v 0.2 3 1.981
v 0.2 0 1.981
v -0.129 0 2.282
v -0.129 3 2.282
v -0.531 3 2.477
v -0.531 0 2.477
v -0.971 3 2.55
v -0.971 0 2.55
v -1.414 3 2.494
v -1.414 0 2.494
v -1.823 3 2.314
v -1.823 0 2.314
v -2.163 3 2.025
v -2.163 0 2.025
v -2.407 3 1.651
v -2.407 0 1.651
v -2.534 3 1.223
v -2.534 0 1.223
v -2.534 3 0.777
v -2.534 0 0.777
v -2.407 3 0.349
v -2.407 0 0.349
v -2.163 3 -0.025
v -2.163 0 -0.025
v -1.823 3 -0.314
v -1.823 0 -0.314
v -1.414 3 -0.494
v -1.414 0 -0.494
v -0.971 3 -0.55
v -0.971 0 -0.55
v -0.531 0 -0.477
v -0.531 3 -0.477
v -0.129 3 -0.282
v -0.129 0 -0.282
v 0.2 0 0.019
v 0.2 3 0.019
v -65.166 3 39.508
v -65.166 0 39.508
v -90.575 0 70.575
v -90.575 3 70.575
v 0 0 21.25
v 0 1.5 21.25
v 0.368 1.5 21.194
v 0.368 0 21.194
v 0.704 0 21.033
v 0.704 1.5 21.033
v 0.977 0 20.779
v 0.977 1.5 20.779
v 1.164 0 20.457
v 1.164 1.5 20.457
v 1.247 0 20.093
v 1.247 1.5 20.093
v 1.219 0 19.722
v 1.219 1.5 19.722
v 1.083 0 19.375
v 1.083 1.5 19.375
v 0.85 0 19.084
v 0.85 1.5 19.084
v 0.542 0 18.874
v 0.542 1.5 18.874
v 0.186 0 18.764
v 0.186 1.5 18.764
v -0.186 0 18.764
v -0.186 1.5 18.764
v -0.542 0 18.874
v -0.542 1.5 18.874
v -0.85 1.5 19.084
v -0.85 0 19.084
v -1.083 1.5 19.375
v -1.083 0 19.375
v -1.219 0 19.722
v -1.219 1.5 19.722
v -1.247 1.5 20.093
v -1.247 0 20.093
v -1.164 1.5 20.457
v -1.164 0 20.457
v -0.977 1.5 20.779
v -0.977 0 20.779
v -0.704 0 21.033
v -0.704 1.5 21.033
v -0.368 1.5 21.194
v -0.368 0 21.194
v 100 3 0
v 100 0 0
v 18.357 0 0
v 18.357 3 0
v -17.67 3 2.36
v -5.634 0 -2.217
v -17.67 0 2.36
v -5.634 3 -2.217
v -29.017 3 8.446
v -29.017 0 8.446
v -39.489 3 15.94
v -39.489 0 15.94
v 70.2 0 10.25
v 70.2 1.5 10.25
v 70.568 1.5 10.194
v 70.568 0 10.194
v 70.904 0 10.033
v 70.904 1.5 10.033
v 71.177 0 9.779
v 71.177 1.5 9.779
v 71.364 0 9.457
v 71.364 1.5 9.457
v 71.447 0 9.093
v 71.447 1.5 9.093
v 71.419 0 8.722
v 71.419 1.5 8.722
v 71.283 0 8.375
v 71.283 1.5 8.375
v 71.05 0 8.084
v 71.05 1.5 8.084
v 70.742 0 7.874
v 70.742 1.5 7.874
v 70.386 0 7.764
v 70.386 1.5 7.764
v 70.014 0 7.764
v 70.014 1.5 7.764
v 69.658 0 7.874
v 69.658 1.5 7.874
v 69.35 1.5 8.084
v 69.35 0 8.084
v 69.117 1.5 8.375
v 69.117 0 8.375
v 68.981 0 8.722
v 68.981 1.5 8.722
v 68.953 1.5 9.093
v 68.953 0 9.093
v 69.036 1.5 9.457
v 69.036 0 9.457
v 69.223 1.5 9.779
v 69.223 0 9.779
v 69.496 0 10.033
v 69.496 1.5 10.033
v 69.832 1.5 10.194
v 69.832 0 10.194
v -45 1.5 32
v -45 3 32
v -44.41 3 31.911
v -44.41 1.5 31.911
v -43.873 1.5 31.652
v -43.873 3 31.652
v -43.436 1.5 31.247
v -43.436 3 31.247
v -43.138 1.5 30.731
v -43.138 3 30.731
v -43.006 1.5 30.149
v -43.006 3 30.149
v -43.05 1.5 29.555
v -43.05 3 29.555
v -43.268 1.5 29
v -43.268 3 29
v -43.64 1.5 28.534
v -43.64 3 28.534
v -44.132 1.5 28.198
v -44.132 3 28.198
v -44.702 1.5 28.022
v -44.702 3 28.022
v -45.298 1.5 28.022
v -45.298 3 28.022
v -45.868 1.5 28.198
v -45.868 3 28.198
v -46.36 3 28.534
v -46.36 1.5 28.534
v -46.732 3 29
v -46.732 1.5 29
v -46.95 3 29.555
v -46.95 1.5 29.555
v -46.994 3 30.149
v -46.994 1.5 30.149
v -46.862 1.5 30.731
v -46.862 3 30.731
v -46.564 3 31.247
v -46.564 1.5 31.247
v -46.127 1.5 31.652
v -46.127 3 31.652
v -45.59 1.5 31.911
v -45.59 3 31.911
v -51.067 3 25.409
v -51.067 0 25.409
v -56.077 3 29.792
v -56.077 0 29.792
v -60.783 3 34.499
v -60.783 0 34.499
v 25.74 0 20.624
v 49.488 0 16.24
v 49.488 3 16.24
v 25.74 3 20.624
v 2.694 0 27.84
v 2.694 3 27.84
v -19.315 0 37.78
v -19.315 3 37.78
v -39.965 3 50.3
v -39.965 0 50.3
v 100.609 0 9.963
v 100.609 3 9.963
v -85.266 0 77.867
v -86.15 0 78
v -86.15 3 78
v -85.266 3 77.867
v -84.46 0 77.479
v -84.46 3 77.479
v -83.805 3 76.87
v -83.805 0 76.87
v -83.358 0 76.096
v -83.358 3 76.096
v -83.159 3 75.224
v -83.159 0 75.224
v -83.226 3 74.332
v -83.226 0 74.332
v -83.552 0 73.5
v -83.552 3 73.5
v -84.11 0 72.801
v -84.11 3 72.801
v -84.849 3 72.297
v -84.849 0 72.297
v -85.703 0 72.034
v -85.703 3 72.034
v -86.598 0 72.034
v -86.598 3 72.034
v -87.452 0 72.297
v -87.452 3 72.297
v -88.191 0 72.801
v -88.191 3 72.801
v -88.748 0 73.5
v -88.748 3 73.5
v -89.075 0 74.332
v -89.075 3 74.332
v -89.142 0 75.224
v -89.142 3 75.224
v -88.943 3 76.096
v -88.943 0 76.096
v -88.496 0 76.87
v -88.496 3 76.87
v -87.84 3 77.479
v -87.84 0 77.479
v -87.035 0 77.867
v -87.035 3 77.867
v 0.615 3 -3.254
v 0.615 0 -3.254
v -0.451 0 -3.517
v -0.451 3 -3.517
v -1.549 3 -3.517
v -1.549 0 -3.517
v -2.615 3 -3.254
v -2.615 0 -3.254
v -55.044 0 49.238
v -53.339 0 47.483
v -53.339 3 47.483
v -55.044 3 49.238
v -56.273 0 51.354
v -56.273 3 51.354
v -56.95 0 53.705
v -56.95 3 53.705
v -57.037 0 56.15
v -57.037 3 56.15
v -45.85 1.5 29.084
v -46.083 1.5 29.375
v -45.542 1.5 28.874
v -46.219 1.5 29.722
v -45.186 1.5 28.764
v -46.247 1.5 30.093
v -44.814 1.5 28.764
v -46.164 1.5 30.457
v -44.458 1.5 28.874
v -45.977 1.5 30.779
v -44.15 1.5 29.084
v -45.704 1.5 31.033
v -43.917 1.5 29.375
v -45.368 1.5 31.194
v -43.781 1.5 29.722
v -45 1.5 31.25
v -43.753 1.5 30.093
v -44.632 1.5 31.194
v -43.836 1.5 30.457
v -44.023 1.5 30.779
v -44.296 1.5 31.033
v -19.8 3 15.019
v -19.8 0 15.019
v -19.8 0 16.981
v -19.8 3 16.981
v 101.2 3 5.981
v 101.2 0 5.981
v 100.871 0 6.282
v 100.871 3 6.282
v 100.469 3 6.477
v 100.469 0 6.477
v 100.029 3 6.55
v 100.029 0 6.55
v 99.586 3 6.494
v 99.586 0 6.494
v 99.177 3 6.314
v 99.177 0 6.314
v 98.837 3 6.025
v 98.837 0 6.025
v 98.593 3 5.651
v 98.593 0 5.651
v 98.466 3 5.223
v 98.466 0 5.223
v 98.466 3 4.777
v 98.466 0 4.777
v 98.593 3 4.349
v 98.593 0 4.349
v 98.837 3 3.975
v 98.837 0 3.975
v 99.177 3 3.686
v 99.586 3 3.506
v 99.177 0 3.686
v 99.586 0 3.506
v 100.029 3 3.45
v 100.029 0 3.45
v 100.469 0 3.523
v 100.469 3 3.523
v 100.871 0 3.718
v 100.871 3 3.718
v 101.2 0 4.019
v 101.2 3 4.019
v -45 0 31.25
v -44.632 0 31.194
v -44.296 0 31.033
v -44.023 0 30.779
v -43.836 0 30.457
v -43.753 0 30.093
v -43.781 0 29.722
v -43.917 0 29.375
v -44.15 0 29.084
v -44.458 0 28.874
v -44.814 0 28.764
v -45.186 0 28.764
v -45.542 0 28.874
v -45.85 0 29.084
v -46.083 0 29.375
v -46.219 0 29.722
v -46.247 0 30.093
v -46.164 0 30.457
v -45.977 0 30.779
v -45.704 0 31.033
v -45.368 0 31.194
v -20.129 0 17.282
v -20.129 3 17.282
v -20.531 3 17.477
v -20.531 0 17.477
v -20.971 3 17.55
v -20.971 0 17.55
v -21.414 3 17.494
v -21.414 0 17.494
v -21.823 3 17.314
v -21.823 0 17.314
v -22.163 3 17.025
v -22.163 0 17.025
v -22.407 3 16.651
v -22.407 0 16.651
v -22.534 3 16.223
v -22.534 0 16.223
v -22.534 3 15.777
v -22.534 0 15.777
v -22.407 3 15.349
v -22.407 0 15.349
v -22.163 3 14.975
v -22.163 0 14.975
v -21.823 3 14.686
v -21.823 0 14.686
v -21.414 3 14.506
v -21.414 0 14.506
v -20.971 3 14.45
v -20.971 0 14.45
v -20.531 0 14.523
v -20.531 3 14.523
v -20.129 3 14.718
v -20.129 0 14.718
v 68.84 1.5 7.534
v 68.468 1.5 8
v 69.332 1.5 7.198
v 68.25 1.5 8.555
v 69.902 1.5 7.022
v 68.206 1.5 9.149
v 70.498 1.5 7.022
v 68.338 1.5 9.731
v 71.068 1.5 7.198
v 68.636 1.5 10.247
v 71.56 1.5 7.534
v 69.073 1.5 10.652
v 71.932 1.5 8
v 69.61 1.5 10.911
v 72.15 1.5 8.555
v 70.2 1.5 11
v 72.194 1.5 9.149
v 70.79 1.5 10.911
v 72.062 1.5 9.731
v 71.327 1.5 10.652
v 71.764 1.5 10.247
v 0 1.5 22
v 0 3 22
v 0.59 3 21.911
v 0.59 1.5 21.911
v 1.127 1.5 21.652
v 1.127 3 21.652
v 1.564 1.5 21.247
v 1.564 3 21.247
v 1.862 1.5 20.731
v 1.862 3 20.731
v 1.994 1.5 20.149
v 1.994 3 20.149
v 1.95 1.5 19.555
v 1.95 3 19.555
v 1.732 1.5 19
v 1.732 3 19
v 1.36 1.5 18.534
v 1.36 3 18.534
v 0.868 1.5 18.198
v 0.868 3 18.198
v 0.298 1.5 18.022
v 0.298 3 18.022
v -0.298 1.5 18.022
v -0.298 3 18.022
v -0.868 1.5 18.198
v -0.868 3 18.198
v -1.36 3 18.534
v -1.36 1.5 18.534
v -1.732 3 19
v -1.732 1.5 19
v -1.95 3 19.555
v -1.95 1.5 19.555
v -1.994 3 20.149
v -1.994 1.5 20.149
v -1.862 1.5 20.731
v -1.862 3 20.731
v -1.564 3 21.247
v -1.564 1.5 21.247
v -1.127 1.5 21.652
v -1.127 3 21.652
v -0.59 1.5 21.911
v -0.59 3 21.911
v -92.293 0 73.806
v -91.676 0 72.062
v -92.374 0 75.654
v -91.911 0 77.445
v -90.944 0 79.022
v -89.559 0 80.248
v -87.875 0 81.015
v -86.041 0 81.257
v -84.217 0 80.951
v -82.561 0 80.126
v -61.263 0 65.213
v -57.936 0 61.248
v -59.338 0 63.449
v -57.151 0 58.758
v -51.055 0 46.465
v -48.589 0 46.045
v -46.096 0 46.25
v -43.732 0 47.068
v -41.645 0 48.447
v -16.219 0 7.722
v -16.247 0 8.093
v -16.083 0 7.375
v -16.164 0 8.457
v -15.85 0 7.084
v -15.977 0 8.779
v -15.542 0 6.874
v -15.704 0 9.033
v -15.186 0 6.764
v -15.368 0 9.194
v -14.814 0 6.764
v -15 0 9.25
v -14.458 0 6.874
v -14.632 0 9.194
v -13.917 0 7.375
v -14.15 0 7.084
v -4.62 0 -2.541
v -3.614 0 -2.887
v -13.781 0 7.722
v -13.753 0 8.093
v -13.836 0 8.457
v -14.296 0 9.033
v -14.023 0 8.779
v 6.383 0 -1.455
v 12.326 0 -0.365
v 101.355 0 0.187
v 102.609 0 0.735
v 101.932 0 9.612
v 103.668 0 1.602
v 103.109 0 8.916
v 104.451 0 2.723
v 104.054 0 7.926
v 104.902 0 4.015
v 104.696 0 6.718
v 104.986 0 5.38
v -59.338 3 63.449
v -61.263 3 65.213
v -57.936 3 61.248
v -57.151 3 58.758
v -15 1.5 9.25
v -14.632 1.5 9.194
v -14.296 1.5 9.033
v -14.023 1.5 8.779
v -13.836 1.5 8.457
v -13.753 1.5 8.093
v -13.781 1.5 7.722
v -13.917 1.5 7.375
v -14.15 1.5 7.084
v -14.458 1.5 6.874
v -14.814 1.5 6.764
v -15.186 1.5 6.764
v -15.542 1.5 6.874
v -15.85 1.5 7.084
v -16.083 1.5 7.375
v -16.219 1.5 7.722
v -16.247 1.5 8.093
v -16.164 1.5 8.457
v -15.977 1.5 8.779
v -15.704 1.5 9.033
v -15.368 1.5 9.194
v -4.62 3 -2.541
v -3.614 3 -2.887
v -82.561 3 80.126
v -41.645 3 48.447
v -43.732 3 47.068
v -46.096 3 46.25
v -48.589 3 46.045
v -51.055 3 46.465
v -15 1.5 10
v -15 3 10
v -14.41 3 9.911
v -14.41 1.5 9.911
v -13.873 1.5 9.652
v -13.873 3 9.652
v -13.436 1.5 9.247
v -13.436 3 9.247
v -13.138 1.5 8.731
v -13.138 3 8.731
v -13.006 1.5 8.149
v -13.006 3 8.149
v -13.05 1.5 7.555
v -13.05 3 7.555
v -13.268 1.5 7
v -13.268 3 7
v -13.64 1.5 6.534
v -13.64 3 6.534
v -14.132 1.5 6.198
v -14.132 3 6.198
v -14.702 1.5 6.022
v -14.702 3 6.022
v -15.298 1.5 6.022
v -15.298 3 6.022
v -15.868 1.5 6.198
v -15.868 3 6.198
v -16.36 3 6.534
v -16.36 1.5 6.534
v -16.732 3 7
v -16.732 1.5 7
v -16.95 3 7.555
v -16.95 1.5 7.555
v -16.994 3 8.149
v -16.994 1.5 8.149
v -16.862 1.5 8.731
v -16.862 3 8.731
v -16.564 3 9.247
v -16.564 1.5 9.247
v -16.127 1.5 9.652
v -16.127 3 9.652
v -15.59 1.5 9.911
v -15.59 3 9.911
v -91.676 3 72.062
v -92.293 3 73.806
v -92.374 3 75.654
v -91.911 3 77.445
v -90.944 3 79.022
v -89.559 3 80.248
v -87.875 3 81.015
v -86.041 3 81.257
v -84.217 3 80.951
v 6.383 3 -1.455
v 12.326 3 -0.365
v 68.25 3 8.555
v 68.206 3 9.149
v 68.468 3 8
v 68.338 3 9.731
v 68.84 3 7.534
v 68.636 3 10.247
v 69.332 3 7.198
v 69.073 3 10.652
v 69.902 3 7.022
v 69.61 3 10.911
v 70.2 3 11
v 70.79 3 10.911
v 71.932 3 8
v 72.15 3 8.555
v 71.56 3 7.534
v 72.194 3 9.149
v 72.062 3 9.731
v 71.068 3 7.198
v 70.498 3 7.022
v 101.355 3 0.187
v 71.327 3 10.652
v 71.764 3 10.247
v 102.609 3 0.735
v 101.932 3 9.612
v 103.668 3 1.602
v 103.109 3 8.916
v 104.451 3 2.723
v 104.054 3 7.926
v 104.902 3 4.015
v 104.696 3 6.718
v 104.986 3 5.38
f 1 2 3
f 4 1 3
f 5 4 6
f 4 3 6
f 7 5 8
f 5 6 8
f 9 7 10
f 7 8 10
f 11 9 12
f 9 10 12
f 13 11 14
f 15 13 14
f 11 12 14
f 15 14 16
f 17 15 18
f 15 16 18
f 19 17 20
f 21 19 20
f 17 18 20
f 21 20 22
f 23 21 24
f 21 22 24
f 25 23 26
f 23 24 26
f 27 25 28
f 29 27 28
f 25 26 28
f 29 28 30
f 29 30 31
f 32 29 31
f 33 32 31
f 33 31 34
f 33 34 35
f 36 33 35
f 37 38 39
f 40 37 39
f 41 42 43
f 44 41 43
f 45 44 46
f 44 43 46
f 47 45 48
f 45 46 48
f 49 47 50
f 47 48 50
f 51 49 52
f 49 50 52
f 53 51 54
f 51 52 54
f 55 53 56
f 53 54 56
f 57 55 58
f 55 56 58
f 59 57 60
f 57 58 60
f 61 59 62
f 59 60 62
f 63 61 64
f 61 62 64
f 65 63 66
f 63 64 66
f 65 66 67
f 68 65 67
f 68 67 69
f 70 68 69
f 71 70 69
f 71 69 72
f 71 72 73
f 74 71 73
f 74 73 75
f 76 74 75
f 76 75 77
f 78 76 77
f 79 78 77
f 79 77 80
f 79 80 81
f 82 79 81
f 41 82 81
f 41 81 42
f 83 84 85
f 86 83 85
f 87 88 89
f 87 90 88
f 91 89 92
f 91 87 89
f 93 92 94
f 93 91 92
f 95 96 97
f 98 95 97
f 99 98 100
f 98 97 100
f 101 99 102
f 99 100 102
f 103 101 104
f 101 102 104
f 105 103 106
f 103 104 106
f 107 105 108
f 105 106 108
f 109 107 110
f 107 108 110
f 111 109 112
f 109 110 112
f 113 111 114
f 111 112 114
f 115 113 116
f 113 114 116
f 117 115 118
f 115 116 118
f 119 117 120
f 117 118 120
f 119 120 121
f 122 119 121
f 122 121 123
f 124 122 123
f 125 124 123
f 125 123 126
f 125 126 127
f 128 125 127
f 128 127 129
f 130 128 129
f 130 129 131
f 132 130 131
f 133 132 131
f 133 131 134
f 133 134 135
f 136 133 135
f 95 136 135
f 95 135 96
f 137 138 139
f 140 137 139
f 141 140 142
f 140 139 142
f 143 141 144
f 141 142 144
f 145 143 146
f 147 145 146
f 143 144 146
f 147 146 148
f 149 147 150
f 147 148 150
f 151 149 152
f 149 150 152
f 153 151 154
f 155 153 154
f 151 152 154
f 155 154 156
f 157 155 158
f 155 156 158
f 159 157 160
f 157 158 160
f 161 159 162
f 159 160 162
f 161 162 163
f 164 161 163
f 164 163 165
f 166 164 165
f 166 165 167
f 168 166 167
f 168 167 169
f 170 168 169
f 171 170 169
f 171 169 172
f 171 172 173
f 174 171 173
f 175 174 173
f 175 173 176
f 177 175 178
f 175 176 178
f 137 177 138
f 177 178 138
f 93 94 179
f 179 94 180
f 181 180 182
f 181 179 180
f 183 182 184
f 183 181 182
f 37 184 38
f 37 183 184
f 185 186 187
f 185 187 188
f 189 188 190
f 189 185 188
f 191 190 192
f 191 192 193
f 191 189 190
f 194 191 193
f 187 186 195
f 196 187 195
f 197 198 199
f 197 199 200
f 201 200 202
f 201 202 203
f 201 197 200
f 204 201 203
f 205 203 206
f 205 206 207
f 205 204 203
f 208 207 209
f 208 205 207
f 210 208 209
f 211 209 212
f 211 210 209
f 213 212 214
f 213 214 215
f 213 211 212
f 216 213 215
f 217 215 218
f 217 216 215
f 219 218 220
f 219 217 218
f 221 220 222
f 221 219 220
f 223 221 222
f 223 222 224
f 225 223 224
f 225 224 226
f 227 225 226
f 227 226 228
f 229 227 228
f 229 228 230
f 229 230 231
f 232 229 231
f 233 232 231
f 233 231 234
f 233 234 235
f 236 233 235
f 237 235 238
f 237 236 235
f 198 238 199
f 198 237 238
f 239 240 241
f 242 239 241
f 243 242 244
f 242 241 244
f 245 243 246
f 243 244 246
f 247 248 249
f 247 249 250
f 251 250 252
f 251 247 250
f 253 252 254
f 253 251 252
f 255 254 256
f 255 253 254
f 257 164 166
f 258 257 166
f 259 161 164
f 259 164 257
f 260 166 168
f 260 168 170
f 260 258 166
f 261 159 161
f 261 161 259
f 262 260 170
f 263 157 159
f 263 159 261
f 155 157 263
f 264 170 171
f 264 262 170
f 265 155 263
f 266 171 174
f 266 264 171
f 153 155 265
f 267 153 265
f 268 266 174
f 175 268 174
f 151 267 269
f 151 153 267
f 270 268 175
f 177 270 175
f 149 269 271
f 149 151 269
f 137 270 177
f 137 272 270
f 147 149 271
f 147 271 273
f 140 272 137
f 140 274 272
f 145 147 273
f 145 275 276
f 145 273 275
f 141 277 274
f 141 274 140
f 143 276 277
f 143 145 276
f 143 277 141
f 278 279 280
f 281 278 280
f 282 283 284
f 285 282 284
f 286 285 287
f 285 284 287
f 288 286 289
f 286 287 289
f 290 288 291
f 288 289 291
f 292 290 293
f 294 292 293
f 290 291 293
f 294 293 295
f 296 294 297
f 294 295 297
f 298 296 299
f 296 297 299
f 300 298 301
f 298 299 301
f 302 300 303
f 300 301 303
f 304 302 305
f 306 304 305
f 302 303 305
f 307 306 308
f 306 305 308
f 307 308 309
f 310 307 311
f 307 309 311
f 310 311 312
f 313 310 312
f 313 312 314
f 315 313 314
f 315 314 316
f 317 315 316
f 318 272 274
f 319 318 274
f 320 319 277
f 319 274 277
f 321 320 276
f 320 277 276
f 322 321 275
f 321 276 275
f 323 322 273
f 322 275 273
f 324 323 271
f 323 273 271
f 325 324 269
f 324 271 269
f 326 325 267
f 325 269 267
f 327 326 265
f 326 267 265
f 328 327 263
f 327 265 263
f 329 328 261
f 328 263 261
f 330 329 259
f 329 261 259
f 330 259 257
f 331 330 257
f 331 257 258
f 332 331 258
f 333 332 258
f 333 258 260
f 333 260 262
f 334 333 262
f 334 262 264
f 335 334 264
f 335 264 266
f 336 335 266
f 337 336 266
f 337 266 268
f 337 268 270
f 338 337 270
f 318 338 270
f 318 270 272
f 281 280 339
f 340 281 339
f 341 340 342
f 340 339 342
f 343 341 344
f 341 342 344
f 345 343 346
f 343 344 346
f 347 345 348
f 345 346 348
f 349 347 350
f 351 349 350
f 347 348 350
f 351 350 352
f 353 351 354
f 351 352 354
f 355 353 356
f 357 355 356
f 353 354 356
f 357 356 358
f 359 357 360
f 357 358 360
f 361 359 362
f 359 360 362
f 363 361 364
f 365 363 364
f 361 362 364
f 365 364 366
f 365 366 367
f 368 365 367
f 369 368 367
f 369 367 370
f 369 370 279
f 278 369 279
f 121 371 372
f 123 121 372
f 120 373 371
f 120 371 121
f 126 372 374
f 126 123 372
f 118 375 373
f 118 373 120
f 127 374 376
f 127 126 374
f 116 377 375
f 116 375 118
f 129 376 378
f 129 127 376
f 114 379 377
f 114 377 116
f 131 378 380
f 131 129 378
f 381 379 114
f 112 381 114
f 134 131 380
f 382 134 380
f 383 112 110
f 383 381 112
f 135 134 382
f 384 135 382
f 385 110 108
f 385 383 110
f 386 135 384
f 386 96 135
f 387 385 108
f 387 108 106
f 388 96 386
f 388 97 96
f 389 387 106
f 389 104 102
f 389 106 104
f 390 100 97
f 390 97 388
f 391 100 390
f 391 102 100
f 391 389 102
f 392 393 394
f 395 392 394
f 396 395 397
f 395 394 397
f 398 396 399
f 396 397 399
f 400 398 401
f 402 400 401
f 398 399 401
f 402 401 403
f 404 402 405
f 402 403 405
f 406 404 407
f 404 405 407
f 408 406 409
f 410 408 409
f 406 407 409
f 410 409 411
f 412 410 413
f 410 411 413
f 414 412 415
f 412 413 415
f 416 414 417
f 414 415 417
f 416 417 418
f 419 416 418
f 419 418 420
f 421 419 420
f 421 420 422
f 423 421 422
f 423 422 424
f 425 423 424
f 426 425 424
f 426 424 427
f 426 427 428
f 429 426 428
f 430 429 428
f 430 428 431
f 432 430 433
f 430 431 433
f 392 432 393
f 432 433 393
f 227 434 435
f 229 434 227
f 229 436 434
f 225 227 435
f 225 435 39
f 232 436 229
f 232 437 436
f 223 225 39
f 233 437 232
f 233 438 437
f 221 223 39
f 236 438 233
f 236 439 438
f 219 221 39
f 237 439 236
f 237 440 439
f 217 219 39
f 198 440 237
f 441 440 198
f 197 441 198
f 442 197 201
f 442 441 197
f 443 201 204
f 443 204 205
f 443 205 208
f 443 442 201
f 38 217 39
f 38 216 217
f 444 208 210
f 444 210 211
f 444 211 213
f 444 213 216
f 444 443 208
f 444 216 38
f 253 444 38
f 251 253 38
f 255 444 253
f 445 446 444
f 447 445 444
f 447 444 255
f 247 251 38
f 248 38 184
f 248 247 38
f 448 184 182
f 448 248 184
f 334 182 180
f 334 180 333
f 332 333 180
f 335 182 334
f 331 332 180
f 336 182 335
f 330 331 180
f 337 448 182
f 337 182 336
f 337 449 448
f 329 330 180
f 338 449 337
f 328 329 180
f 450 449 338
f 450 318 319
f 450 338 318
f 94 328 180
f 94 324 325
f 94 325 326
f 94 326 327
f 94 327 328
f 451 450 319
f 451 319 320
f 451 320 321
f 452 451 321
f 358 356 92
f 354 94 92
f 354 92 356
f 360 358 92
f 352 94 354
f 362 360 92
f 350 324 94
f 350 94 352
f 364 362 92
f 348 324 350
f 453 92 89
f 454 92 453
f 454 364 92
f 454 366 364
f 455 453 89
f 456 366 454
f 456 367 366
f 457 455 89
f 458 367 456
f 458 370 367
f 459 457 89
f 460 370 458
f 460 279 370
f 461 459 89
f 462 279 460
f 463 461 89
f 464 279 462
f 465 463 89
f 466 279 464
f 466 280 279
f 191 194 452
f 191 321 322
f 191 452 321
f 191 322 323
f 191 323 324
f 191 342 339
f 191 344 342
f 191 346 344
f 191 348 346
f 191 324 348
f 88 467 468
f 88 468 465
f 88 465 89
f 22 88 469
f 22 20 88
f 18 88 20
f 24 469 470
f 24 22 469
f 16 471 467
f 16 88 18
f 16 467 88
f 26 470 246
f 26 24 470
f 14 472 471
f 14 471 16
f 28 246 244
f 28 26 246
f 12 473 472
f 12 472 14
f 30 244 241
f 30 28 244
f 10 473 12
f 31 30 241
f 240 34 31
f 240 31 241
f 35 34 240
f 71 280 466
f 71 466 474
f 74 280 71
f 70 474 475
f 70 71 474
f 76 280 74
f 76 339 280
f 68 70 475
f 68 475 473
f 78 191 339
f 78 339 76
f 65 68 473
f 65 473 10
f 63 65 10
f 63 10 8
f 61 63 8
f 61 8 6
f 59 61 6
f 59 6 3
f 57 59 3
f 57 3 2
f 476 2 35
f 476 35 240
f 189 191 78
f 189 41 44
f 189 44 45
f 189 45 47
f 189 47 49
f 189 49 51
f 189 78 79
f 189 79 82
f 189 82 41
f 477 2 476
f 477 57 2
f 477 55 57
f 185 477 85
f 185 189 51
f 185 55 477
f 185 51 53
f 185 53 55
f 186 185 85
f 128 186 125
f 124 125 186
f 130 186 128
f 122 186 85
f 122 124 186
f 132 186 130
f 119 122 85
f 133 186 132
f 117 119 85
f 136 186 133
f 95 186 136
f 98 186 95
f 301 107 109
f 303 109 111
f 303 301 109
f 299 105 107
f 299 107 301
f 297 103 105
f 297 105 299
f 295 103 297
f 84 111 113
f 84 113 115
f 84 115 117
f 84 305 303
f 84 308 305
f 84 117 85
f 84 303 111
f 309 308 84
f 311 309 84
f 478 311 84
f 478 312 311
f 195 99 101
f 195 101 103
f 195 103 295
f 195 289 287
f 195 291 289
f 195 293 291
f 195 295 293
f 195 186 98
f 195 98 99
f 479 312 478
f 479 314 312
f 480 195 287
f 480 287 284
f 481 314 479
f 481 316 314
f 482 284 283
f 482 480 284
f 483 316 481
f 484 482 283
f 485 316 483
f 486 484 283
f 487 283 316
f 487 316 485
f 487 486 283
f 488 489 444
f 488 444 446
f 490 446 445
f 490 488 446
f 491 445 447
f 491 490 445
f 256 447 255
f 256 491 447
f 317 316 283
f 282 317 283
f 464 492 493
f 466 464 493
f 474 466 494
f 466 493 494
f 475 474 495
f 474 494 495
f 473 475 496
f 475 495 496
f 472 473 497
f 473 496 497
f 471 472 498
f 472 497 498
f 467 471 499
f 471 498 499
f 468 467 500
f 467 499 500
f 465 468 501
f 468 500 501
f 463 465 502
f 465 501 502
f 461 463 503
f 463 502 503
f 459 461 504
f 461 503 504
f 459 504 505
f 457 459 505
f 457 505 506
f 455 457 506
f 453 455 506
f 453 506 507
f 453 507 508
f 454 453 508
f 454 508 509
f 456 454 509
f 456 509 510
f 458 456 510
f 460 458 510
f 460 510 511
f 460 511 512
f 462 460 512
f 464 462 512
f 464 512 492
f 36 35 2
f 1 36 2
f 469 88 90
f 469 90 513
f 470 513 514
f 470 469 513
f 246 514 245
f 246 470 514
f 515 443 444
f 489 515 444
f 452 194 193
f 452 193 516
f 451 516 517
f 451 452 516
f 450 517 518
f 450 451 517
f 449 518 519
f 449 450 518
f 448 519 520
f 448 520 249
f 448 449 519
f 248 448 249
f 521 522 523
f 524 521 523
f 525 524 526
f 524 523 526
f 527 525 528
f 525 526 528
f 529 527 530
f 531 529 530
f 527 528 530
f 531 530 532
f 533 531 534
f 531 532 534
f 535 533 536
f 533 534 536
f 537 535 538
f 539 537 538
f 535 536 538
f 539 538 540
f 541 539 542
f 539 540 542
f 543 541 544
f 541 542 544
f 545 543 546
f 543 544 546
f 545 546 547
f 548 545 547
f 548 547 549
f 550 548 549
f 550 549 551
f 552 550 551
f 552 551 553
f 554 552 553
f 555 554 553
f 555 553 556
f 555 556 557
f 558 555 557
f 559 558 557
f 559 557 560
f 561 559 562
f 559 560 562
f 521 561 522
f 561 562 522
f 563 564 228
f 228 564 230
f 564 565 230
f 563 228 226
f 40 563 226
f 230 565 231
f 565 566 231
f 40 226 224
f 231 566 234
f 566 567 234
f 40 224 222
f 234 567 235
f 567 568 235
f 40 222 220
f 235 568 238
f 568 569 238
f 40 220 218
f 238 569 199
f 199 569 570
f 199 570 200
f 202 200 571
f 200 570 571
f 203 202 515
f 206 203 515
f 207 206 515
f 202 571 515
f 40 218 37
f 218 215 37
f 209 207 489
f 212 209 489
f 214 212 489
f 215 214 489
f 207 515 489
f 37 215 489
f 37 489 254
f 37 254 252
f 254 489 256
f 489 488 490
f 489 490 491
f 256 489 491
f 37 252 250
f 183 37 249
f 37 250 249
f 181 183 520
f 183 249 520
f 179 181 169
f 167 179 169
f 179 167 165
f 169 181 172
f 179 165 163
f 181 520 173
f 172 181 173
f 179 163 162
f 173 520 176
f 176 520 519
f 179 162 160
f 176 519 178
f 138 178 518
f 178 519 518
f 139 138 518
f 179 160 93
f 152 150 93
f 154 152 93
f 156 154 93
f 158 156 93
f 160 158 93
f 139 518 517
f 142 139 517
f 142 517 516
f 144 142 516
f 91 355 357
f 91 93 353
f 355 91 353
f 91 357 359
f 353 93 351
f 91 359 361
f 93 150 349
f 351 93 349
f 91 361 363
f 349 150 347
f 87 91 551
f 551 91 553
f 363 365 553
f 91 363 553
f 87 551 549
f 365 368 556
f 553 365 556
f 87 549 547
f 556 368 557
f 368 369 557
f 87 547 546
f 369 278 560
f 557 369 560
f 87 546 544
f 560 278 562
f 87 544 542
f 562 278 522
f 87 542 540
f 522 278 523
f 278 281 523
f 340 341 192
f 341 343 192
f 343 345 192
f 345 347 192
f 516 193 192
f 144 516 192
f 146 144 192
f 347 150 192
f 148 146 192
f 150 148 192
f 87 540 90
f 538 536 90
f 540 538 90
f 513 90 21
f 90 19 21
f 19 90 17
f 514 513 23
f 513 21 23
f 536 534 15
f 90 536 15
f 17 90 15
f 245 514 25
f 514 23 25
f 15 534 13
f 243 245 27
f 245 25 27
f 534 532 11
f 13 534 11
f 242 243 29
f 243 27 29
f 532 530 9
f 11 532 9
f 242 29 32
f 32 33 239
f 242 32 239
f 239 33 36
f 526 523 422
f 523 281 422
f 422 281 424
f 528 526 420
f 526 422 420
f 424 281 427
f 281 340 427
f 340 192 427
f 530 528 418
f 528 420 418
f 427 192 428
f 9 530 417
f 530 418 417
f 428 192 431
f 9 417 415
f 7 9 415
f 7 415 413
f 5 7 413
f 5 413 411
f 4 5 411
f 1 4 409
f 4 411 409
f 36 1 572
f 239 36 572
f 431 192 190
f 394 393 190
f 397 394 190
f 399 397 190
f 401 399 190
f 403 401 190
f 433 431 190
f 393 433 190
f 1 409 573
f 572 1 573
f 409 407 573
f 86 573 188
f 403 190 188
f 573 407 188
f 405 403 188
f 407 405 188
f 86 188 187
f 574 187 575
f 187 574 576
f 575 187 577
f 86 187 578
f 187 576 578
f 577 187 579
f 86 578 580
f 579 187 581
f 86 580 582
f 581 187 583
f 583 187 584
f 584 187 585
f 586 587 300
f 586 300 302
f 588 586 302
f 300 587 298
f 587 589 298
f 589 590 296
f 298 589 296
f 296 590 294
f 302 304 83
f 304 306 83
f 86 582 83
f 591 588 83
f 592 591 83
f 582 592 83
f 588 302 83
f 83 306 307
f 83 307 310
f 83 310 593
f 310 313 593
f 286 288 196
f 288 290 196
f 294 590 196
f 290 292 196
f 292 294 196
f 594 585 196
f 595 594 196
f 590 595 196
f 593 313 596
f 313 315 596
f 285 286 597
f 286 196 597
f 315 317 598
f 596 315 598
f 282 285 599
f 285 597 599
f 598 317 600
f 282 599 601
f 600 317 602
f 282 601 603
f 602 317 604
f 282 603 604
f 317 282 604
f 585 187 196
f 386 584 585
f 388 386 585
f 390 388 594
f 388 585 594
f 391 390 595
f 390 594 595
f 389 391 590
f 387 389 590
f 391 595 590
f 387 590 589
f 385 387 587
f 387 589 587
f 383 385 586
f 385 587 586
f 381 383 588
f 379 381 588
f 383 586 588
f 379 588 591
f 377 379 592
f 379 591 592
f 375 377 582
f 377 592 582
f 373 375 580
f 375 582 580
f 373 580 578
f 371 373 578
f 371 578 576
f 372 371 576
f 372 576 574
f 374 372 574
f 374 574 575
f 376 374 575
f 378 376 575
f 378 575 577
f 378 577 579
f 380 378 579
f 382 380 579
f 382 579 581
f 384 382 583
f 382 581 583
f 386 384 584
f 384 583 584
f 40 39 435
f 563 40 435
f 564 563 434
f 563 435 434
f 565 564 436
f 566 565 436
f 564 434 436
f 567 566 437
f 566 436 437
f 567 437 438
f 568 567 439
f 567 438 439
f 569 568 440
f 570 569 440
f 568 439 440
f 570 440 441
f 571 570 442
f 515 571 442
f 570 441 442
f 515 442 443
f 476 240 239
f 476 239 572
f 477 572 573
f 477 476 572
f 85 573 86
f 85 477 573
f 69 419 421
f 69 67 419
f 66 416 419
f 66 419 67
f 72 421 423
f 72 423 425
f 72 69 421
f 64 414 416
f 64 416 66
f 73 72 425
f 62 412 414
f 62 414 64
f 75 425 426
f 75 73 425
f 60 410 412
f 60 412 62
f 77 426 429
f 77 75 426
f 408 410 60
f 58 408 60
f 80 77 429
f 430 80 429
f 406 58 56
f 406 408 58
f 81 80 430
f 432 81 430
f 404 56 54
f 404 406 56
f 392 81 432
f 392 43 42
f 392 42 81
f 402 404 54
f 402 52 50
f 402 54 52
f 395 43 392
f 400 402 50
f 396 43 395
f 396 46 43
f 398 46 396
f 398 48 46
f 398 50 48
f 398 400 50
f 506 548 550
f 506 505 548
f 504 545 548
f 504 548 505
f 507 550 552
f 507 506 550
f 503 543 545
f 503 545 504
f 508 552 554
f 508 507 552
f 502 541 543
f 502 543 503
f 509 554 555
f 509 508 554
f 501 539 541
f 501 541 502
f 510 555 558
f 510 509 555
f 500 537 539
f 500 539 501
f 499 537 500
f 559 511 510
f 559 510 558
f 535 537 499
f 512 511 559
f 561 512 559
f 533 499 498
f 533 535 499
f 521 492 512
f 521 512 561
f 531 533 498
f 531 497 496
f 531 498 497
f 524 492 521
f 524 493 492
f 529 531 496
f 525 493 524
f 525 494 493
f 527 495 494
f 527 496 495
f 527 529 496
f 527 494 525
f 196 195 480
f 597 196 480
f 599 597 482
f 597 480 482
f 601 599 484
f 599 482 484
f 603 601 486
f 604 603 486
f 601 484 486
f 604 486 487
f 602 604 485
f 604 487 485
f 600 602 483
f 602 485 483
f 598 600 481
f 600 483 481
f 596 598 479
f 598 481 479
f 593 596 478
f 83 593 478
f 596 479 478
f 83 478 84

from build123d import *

# Parameters (mm, degrees)
SKETCH_3_R          = 3
EXTRUDE_1_DEPTH     = 3
FILLET_1_R          = 200
FILLET_3_R          = 50
SKETCH_4_R          = 1.25
CUT_EXTRUDE_1_DEPTH = 133.803621182
SKETCH_4_3_R        = 2
SKETCH_4_3_R_2      = 1.25
CUT_EXTRUDE_2_DEPTH = 1.5
FILLET_4_R          = 10
FILLET_5_R          = 10
FILLET_6_R          = 100


# Some blends are built 0.0001 mm under size
with BuildPart() as part:
    # 草图3 → 凸台-拉伸1 (new body)
    with BuildSketch(Plane(origin=(0, 0, 0), x_dir=(1, 0, 0), z_dir=(0, 1, 0))):
        with BuildLine():
            ThreePointArc((3.438749824, 0), (-1, 3.55), (-5.438749824, 0))
            Line((-5.438749824, 0), (-20, 0))
            Line((-20, 0), (-58.823128982, -31.75206117))
            Line((-58.823128982, -31.75206117), (-90.575190152, -70.575190152))
            ThreePointArc((-90.575190152, -70.575190152), (-90.944000004, -79.022324522), (-82.561153427, -80.12594721))
            Line((-82.561153427, -80.12594721), (-53.071679833, -59.477195502))
            Line((-53.071679833, -59.477195502), (-58.807444196, -51.285675059))
            Line((-58.807444196, -51.285675059), (-45.701011487, -42.108452077))
            Line((-45.701011487, -42.108452077), (-39.965247124, -50.29997252))
            Line((-39.965247124, -50.29997252), (0, -22.316005218))
            Line((0, -22.316005218), (100.609346717, -9.962730758))
            ThreePointArc((100.609346717, -9.962730758), (104.990673992, -4.694757302), (100, 0))
            Line((100, 0), (3.438749824, 0))
        make_face()
        with BuildLine():
            Line((0.2, -0.018929156), (0.2, -1.981070844))
            ThreePointArc((0.2, -1.981070844), (-2.55, -1), (0.2, -0.018929156))
        make_face(mode=Mode.SUBTRACT)
        with BuildLine():
            ThreePointArc((-19.8, -16.981070844), (-22.55, -16), (-19.8, -15.018929156))
            Line((-19.8, -15.018929156), (-19.8, -16.981070844))
        make_face(mode=Mode.SUBTRACT)
        with BuildLine():
            ThreePointArc((101.2, -5.981070844), (98.45, -5), (101.2, -4.018929156))
            Line((101.2, -4.018929156), (101.2, -5.981070844))
        make_face(mode=Mode.SUBTRACT)
        with Locations(Location((-86.150380304, -75, 0), (0, 0, 270))):
            Circle(SKETCH_3_R, mode=Mode.SUBTRACT)
    extrude(amount=EXTRUDE_1_DEPTH)

    # 圆角1
    # the kernel refuses this fillet: 200 mm, written as the material it adds along each edge
    with BuildSketch(Plane(origin=(0, 0, 22.316005218), x_dir=(-0.8191520442889868, 0, 0.5735764363510532), z_dir=(0, 1, 0))) as fillet_1_piece_1:
        with BuildLine():
            CenterArc((49.871110762, 199.997070178), FILLET_1_R, 242, 27.689869999)
            Line((-44.023201795, 23.407551606), (-45.901088046, 19.875761235))
            Line((-45.901088046, 19.875761235), (-1.877886251, -3.531790371))
            Line((-1.877886251, -3.531790371), (0, -4))
            ThreePointArc((0, -4), (24.394279061, -4), (48.76690707, -3.999941404))
            Line((48.76690707, -3.999941404), (48.788558122, 0))
        make_face()
    extrude(amount=3)

    # 圆角3
    # the kernel refuses this fillet: 50 mm, written as the material it adds along each edge
    with BuildSketch(Plane(origin=(3.438749824, 0, 0), x_dir=(-0.6554771924780477, 0, -0.7552149694895463), z_dir=(0, 1, 0))) as fillet_3_piece_1:
        with BuildLine():
            CenterArc((27.982022488, -44.040522037), FILLET_3_R, 118.259718548, 20.784438328)
            Line((-9.778725986, -11.266662413), (-10.533940956, -10.611185221))
            Line((-10.533940956, -10.611185221), (-0.755214969, 0.655477192))
            Line((-0.755214969, 0.655477192), (0.473469078, 0.880810441))
            ThreePointArc((0.473469078, 0.880810441), (2.154284303, 0.457687505), (3.835099529, 0.880810441))
            Line((3.835099529, 0.880810441), (4.308568607, 0))
        make_face()
    extrude(amount=3)
    with BuildSketch(Plane(origin=(-5.438749824, 0, 0), x_dir=(-1, 0, 0), z_dir=(0, 1, 0))) as fillet_3_piece_2:
        with BuildLine():
            CenterArc((14.921910743, -49.998699223), FILLET_3_R, 90.413290151, 20.374998027)
            Line((-2.823882627, -3.253787011), (-3.178798495, -2.318888767))
            ThreePointArc((-3.178798495, -2.318888767), (-1.757658507, -1.32685396), (-0.975549412, 0.21978022))
            Line((-0.975549412, 0.21978022), (0, 1))
            ThreePointArc((0, 1), (7.280625088, 1), (14.554036965, 0.999973984))
            Line((14.554036965, 0.999973984), (14.561250176, 0))
        make_face()
    extrude(amount=3)

    # 草图4 → 切除-拉伸1 (cut, through all)
    with BuildSketch(Plane(origin=(0, 3, 0), x_dir=(1, 0, 0), z_dir=(0, 1, 0))):
        with Locations(Location((70.2, -9, 0), (0, 0, 270))):
            Circle(SKETCH_4_R)
        with Locations(Location((0, -20, 0), (0, 0, 270))):
            Circle(SKETCH_4_R)
        with Locations(Location((-45, -30, 0), (0, 0, 270))):
            Circle(SKETCH_4_R)
        with Locations(Location((-15, -8, 0), (0, 0, 270))):
            Circle(SKETCH_4_R)
    extrude(amount=-CUT_EXTRUDE_1_DEPTH, mode=Mode.SUBTRACT)

    # 草图4<3> → 切除-拉伸2 (cut)
    # profile 1 of 4: a face of its own
    with BuildSketch(Plane(origin=(0, 3, 0), x_dir=(1, 0, 0), z_dir=(0, 1, 0))):
        with Locations(Location((70.2, -9, 0), (0, 0, 270))):
            Circle(SKETCH_4_3_R)
        with Locations(Location((70.2, -9, 0), (0, 0, 270))):
            Circle(SKETCH_4_3_R_2, mode=Mode.SUBTRACT)
    # profile 2 of 4: a face of its own
    with BuildSketch(Plane(origin=(0, 3, 0), x_dir=(1, 0, 0), z_dir=(0, 1, 0))):
        with Locations(Location((0, -20, 0), (0, 0, 270))):
            Circle(SKETCH_4_3_R)
        with Locations(Location((0, -20, 0), (0, 0, 270))):
            Circle(SKETCH_4_3_R_2, mode=Mode.SUBTRACT)
    # profile 3 of 4: a face of its own
    with BuildSketch(Plane(origin=(0, 3, 0), x_dir=(1, 0, 0), z_dir=(0, 1, 0))):
        with Locations(Location((-45, -30, 0), (0, 0, 270))):
            Circle(SKETCH_4_3_R)
        with Locations(Location((-45, -30, 0), (0, 0, 270))):
            Circle(SKETCH_4_3_R_2, mode=Mode.SUBTRACT)
    # profile 4 of 4: a face of its own
    with BuildSketch(Plane(origin=(0, 3, 0), x_dir=(1, 0, 0), z_dir=(0, 1, 0))):
        with Locations(Location((-15, -8, 0), (0, 0, 270))):
            Circle(SKETCH_4_3_R)
        with Locations(Location((-15, -8, 0), (0, 0, 270))):
            Circle(SKETCH_4_3_R_2, mode=Mode.SUBTRACT)
    extrude(amount=-CUT_EXTRUDE_2_DEPTH, mode=Mode.SUBTRACT)

    # 圆角4
    fillet_4_edges = [part.edges().sort_by_distance(p)[0] for p in [
        (-53.071679833, 1.5, 59.477195502),
    ]]
    fillet(fillet_4_edges, radius=FILLET_4_R - 0.0001)  # a hair under: the kernel refuses the full size

    # 圆角5
    # the kernel refuses this fillet: 10 mm, written as the material it adds along each edge
    with BuildSketch(Plane(origin=(-45.701011487, 0, 42.108452077), x_dir=(-0.8191520442889864, 0, 0.5735764363510539), z_dir=(0, 1, 0))) as fillet_5_piece_1:
        with BuildLine():
            CenterArc((FILLET_5_R, FILLET_5_R), FILLET_5_R, 180, 90)
            Line((0, FILLET_5_R), (0, 0))
            Line((0, 0), (FILLET_5_R, 0))
        make_face()
    extrude(amount=3)
    with BuildSketch(Plane(origin=(-58.807444196, 0, 51.285675059), x_dir=(0.3420261980761126, 0, 0.9396904170148804), z_dir=(0, 1, 0))) as fillet_5_piece_2:
        with BuildLine():
            CenterArc((7.764622652, 9.659249058), FILLET_5_R, 194.999630824, 60.000165399)
            Line((-1.894652287, 7.071120845), (-2.860579781, 6.812308023))
            Line((-2.860579781, 6.812308023), (-0.965927494, -0.258812821))
            Line((-0.965927494, -0.258812821), (0.258812821, -0.965927494))
            ThreePointArc((0.258812821, -0.965927494), (0.258909414, -0.965901613), (4.917575367, -0.965924906))
            Line((4.917575367, -0.965924906), (5.176397847, 0))
        make_face()
    extrude(amount=3)

    # 圆角6
    fillet_6_edges = [part.edges().sort_by_distance(p)[0] for p in [
        (-58.823128982, 1.5, 31.75206117),
        (-20, 1.5, 0),
    ]]
    fillet(fillet_6_edges, radius=FILLET_6_R)


solid = part.part
